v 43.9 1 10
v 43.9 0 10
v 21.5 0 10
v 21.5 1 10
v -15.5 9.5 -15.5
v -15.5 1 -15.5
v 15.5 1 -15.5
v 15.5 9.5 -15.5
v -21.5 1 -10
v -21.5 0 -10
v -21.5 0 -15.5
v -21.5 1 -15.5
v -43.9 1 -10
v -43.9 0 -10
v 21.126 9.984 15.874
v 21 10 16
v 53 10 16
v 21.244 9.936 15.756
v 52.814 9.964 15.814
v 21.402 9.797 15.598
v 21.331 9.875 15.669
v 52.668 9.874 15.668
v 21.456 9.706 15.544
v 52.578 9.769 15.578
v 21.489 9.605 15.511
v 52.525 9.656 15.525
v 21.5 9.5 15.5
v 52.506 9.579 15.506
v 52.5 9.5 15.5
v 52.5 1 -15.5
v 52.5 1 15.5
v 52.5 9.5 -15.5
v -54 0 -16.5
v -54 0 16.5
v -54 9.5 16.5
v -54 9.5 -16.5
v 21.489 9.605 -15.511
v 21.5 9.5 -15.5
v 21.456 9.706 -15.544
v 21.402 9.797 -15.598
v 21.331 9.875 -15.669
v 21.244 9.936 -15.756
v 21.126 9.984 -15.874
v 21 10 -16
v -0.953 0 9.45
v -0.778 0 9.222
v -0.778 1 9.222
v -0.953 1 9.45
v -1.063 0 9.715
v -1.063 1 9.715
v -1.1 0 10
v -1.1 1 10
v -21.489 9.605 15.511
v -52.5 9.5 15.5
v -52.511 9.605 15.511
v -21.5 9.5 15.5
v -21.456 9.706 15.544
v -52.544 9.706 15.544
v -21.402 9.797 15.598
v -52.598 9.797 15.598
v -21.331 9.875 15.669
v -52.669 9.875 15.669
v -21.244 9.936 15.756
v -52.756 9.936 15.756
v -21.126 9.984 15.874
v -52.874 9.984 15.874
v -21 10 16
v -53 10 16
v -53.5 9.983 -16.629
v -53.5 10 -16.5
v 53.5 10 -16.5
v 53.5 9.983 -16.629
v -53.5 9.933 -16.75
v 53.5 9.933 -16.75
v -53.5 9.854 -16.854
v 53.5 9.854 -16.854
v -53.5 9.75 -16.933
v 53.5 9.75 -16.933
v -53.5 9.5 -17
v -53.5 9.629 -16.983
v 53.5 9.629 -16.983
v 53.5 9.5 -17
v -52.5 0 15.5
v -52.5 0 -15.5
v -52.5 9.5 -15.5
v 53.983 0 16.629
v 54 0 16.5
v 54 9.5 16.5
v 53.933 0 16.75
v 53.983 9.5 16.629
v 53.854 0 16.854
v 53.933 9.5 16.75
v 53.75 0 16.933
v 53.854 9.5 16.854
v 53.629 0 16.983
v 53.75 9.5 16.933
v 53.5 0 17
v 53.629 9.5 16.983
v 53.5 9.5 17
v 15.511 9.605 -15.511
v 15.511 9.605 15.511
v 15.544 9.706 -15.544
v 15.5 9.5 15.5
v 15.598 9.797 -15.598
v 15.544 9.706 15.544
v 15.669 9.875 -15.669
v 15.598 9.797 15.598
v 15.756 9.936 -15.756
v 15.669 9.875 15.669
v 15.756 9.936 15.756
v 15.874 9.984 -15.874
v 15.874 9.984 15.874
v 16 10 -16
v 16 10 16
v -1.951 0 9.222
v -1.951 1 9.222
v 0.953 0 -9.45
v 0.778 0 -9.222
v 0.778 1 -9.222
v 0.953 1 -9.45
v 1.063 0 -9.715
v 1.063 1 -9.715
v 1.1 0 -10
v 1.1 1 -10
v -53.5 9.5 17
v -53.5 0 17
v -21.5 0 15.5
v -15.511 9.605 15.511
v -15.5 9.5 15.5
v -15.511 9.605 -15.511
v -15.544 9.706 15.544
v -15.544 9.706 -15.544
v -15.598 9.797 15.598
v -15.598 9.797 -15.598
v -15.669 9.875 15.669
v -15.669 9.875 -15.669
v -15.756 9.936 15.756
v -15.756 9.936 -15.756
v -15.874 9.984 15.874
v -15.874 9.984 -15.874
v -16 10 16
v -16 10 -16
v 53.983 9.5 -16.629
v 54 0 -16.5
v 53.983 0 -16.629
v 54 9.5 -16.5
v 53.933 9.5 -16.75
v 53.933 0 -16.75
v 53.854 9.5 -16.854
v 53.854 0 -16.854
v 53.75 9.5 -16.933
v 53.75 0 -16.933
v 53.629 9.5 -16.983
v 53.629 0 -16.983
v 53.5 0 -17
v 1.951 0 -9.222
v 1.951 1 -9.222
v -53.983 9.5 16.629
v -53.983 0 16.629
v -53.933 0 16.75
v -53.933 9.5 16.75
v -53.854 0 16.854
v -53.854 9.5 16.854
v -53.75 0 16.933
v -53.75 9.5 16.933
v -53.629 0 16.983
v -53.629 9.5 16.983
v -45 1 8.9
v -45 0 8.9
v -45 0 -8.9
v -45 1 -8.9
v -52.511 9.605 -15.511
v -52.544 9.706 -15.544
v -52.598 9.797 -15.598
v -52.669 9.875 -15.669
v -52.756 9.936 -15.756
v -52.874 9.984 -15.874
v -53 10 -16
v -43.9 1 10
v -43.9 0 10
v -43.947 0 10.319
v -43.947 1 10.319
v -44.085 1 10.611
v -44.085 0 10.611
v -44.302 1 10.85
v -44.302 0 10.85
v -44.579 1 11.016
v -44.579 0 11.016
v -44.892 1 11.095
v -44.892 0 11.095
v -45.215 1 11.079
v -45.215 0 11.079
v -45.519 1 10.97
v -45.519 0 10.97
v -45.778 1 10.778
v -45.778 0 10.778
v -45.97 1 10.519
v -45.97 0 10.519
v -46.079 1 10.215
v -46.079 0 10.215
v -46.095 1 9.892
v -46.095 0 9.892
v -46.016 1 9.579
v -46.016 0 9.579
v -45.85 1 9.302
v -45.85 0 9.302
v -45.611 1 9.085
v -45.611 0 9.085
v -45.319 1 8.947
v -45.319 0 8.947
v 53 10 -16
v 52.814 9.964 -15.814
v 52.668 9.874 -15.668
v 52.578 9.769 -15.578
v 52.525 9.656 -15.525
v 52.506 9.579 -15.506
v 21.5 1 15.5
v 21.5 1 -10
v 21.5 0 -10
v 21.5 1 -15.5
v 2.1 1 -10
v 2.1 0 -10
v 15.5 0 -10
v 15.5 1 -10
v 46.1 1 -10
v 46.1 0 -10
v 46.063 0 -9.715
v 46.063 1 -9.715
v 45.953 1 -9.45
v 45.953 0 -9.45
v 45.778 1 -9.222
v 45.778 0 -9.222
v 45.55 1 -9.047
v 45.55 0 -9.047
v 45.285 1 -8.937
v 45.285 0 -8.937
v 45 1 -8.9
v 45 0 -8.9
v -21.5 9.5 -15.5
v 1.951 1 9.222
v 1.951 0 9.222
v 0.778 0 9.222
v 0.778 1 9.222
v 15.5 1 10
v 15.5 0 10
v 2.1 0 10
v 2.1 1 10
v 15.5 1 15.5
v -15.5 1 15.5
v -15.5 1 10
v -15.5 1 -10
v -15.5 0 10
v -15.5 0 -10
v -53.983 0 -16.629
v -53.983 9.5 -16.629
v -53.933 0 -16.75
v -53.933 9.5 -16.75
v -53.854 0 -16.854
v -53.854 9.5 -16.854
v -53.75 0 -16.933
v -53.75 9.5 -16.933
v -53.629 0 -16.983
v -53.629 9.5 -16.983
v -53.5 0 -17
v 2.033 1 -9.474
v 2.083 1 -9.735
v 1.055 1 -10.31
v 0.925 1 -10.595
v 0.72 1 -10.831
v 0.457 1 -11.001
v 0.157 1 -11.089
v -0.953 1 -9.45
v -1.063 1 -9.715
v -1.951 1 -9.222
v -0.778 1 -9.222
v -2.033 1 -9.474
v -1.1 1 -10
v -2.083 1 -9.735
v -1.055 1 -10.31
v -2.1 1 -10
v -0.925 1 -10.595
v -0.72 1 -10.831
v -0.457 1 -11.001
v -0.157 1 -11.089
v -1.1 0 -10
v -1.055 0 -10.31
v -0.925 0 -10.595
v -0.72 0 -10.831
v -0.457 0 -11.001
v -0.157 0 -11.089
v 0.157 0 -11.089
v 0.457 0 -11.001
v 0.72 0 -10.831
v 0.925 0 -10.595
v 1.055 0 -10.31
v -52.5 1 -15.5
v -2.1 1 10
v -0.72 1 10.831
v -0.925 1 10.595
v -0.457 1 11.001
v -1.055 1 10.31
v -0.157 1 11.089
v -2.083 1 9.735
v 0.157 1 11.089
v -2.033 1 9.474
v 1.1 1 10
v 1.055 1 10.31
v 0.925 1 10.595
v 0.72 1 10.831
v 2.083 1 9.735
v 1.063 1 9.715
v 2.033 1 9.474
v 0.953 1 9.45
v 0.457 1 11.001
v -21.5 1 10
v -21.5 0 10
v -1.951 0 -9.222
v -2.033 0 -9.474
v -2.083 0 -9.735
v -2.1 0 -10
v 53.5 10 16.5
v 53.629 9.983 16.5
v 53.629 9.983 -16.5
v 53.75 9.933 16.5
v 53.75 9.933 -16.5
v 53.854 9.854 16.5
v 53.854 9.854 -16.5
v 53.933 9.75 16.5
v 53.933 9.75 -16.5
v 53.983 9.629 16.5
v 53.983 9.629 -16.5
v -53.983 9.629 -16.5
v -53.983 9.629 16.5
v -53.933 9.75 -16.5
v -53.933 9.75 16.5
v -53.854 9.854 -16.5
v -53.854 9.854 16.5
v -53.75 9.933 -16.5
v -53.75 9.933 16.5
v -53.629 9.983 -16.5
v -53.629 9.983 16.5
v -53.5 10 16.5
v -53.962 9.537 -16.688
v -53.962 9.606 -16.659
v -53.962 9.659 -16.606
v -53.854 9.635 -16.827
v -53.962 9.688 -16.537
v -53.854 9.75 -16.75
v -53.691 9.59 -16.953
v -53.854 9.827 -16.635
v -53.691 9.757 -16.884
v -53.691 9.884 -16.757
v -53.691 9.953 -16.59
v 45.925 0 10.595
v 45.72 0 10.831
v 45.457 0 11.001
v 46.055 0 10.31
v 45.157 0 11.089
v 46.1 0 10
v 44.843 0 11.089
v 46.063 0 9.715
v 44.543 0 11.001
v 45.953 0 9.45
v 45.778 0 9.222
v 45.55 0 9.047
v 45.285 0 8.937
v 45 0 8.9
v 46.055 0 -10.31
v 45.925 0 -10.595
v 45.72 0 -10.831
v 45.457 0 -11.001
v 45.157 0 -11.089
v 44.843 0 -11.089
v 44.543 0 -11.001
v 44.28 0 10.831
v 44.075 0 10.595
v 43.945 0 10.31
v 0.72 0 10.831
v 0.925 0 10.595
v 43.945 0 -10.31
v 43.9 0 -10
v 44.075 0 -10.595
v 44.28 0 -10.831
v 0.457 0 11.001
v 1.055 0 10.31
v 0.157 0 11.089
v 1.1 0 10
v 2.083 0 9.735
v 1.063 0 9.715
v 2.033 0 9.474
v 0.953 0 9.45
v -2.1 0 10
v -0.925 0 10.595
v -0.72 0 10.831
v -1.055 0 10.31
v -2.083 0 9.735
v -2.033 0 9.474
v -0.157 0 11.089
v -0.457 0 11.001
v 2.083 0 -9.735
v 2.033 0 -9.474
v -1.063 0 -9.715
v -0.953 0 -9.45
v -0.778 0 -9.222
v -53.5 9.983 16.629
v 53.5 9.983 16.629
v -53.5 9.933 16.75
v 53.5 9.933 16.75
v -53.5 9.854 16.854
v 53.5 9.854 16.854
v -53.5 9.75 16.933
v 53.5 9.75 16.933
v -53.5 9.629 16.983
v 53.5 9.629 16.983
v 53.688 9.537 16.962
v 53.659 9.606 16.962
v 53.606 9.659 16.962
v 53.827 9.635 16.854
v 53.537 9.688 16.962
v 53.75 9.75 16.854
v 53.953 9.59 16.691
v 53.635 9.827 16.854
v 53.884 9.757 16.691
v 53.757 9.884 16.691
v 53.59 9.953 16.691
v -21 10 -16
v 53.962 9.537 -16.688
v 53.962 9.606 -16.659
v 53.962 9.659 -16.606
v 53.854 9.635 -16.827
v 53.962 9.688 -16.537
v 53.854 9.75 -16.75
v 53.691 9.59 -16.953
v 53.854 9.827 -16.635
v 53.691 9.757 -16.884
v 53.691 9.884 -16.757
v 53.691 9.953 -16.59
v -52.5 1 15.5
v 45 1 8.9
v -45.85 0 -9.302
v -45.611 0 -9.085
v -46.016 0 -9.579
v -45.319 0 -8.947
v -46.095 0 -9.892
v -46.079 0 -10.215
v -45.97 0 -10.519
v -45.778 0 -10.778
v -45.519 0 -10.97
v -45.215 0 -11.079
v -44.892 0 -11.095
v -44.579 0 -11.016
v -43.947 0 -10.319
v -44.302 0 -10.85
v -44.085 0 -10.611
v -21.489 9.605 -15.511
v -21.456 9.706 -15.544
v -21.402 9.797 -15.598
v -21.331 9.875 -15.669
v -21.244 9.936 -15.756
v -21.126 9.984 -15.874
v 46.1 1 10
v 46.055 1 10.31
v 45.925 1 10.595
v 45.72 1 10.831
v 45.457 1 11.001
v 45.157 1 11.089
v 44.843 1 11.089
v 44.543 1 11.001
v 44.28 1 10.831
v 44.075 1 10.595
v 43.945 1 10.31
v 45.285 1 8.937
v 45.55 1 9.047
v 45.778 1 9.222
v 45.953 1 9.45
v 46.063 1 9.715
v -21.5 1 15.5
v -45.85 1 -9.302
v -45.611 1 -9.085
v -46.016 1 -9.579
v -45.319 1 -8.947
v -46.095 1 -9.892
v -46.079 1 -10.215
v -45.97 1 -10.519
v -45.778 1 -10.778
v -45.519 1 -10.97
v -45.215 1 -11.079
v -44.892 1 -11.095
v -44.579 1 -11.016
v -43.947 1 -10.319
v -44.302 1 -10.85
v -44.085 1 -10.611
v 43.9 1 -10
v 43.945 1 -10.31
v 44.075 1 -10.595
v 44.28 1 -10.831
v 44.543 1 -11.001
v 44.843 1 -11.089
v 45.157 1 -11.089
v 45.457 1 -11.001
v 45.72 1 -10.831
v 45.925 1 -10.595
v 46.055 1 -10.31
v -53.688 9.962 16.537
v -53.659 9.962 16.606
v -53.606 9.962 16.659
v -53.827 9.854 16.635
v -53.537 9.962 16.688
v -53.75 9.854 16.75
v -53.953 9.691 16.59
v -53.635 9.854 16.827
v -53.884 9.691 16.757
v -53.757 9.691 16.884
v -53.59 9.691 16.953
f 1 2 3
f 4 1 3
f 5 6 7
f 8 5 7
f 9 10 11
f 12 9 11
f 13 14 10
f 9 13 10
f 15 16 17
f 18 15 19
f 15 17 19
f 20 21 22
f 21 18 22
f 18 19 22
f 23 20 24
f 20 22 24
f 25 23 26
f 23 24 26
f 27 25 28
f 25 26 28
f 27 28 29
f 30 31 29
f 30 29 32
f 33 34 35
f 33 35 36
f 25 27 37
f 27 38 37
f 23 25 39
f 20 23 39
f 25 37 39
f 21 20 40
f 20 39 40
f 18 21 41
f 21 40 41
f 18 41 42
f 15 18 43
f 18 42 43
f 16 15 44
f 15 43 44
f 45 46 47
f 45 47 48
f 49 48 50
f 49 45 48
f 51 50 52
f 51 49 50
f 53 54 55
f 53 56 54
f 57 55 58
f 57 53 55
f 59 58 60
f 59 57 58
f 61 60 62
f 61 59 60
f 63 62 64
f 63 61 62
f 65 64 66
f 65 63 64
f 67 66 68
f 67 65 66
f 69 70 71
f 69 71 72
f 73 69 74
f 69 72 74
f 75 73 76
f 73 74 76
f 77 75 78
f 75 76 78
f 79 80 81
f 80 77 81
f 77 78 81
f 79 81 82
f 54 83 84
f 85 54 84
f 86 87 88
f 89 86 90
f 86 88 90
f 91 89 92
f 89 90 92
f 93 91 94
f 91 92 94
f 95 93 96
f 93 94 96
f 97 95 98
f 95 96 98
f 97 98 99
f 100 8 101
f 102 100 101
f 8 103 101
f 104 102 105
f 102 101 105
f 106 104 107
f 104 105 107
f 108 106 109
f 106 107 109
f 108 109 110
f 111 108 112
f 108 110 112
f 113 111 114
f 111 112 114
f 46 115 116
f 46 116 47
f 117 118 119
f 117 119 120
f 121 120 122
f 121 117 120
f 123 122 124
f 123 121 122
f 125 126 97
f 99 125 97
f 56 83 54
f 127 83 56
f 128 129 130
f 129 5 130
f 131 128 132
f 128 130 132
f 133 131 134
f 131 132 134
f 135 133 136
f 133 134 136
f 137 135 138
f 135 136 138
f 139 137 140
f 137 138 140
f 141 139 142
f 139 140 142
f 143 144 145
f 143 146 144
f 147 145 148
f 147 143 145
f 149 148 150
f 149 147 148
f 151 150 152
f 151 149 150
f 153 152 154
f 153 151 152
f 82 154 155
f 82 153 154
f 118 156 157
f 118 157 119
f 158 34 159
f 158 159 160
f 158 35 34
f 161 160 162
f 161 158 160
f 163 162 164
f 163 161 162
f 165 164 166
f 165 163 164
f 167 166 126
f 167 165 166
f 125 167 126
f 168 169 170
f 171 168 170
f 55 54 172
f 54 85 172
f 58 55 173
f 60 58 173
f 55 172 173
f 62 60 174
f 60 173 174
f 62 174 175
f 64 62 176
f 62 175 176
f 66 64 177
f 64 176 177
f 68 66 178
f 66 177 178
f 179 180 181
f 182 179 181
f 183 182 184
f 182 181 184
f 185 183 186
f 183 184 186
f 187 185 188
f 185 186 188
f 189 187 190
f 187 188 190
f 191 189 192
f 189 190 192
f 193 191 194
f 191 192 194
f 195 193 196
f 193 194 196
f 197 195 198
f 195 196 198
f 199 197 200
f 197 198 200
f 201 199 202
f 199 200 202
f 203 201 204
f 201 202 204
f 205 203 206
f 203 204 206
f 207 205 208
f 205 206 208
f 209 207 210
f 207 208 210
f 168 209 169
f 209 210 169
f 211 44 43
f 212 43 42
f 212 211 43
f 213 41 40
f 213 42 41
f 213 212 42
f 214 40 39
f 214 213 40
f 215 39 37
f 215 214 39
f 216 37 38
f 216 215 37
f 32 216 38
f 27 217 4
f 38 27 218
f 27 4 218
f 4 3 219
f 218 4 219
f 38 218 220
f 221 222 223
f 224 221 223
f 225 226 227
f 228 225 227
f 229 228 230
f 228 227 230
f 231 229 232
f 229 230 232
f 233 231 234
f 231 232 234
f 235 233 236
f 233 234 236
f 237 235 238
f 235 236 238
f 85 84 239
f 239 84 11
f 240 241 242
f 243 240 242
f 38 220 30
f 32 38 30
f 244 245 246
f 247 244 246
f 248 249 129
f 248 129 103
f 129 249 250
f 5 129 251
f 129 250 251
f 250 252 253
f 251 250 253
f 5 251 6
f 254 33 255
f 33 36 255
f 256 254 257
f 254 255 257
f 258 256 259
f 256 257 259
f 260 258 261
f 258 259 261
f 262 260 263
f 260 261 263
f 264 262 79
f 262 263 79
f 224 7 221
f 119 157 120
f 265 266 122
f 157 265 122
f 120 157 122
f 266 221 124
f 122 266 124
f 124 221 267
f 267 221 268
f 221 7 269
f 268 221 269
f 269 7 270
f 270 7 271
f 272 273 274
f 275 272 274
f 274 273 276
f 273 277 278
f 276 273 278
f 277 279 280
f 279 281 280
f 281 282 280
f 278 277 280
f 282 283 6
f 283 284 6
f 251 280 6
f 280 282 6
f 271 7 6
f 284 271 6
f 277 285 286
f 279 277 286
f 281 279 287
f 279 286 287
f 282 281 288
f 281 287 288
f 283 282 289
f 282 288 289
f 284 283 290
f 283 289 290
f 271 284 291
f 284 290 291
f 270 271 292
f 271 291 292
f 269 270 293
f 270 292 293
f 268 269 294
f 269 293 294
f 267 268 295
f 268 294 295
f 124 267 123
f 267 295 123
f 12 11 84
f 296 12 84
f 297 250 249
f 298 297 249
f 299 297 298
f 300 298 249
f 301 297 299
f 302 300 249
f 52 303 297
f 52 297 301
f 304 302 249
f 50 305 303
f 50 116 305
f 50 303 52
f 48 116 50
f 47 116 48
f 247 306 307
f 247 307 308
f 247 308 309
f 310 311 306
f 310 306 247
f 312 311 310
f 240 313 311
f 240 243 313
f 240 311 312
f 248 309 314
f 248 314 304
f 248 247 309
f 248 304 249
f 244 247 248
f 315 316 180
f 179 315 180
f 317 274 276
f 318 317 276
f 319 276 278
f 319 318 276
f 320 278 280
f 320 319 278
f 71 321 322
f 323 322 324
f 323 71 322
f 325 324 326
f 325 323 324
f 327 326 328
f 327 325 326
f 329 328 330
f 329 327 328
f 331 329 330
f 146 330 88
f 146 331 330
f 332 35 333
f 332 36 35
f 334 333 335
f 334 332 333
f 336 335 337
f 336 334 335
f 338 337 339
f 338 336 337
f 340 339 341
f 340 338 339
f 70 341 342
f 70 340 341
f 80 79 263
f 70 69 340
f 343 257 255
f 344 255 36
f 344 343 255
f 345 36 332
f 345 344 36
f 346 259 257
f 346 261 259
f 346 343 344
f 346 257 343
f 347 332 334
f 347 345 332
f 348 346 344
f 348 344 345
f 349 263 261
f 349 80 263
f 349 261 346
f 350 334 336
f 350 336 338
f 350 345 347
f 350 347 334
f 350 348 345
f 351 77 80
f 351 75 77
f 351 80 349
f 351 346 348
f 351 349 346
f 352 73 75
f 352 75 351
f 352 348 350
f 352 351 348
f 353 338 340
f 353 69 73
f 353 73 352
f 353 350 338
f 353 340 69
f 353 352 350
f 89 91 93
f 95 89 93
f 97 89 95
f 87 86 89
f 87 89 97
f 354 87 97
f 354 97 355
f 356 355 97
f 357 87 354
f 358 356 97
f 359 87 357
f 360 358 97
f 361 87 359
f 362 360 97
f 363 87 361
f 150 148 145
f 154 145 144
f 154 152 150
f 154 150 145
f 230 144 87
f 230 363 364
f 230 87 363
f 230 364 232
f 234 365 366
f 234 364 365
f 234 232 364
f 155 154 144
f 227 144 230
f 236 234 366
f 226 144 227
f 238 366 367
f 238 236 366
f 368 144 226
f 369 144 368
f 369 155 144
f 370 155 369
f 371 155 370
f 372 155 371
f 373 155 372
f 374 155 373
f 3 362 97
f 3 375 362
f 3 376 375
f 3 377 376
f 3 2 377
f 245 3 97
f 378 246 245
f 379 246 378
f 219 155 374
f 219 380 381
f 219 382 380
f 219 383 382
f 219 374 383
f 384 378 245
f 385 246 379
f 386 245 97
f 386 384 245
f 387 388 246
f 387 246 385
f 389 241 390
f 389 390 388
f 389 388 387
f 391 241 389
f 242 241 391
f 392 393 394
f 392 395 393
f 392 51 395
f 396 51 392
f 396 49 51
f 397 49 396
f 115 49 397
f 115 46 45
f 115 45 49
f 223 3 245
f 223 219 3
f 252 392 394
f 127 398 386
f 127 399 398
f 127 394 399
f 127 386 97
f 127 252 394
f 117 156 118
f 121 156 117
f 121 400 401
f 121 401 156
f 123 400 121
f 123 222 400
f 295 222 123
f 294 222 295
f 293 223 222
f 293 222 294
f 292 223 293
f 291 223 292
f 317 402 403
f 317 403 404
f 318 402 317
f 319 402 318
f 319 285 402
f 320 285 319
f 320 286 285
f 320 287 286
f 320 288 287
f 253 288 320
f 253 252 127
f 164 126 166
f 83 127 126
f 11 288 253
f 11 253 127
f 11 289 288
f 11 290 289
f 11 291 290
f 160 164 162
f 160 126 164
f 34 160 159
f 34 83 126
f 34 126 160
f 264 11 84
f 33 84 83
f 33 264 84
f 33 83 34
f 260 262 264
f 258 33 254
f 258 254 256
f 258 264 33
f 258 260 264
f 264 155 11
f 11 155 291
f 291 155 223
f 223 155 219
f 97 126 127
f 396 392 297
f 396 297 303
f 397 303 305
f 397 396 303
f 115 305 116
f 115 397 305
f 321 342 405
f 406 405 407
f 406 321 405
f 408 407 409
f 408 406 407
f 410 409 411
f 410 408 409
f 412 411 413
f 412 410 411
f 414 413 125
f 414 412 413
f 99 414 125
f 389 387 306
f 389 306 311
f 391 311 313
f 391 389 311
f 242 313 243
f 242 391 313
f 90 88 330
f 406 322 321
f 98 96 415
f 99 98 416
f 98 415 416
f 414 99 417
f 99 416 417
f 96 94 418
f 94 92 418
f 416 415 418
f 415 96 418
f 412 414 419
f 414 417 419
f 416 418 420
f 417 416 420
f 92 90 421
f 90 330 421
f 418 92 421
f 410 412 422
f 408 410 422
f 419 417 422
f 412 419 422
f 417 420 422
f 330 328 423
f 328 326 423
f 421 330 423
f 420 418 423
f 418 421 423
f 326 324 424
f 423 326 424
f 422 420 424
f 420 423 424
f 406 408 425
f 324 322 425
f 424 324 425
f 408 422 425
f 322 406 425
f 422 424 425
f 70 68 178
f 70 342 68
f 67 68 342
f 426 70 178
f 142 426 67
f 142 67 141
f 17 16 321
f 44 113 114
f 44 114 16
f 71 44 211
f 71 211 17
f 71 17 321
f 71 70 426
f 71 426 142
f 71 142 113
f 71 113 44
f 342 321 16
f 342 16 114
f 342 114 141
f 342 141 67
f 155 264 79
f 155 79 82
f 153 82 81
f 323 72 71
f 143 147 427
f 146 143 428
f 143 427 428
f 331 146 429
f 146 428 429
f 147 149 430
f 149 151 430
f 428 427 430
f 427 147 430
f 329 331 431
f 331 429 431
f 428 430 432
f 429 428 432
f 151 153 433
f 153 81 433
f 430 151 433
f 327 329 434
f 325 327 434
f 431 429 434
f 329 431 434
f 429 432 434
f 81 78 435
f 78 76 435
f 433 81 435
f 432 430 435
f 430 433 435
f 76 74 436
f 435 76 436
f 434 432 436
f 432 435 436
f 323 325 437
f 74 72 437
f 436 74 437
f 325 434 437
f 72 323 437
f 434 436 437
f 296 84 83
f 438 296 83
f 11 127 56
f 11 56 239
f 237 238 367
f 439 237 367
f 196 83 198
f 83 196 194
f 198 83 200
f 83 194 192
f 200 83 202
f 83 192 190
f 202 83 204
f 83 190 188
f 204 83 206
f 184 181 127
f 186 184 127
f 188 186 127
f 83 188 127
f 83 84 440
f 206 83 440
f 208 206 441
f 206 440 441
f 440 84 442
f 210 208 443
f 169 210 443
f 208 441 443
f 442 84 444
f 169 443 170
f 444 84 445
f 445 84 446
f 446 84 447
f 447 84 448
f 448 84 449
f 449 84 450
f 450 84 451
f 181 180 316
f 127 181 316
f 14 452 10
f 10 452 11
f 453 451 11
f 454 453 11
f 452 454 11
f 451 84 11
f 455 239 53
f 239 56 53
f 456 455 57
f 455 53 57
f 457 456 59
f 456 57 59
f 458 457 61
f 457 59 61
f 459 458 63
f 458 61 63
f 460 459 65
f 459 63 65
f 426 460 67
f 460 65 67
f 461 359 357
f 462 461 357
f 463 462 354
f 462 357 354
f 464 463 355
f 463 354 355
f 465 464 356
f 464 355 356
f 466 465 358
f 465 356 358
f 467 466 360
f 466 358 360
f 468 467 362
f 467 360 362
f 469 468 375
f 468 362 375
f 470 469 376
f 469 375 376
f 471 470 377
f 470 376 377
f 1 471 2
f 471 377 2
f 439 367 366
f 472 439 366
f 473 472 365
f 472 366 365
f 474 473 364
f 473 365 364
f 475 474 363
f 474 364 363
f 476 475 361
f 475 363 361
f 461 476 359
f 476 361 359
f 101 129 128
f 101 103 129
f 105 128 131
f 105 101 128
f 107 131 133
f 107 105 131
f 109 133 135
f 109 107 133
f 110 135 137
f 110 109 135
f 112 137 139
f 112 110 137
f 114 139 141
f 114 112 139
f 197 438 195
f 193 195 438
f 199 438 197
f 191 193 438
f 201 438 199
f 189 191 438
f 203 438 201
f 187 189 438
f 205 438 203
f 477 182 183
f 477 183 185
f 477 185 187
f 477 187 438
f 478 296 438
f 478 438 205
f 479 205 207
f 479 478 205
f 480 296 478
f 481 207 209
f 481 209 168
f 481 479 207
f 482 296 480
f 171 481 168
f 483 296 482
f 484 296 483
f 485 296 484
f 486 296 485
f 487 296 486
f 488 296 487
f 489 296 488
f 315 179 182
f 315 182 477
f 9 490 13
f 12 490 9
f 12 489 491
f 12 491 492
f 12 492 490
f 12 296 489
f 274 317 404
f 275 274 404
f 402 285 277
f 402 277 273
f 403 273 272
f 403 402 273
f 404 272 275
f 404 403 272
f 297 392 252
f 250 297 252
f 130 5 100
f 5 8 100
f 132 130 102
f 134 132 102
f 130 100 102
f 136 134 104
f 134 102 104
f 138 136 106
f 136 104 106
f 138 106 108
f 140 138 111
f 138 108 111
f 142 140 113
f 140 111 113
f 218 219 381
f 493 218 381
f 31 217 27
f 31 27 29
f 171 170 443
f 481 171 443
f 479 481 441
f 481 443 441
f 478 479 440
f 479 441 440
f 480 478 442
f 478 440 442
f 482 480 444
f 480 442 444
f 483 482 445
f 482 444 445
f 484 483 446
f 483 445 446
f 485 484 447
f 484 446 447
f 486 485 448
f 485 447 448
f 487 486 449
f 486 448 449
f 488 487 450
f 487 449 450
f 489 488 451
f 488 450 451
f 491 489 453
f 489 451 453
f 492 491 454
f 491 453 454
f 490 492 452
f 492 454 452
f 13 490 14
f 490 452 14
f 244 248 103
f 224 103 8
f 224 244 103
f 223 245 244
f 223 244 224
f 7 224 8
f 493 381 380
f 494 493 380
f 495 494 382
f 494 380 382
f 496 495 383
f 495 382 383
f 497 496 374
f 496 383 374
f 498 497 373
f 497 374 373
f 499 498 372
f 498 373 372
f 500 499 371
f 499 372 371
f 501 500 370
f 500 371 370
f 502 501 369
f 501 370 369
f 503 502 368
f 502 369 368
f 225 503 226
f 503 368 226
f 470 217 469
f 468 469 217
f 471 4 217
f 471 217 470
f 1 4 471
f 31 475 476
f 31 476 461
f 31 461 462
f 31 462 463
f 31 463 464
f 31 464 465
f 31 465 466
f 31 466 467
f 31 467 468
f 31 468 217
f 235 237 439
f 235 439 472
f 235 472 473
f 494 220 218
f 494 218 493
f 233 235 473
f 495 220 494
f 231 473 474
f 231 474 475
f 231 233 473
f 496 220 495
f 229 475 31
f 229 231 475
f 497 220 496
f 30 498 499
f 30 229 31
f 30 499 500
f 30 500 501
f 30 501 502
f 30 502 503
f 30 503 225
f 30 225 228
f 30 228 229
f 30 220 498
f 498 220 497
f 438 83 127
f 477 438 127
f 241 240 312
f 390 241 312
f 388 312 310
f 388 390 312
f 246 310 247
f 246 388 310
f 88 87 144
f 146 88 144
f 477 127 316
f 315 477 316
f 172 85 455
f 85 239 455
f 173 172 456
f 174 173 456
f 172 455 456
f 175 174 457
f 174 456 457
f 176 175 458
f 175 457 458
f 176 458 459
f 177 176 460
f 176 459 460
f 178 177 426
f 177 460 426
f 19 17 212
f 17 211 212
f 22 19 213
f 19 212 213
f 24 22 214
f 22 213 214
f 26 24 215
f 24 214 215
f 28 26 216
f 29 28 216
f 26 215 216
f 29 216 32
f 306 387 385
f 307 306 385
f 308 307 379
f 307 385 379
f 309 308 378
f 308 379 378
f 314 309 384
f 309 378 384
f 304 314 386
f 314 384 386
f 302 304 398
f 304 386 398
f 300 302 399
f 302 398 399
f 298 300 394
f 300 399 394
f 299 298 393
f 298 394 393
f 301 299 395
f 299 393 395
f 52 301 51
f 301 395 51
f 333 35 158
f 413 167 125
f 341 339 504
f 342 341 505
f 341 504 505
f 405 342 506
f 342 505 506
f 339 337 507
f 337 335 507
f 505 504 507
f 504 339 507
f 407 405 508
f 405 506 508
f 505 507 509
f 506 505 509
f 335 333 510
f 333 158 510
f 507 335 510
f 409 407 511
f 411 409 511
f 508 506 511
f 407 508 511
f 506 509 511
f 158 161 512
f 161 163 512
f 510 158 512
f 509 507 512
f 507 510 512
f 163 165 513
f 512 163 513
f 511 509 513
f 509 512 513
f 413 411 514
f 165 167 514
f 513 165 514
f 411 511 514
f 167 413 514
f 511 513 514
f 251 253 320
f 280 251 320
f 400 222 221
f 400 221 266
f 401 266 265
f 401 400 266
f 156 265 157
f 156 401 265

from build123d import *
from build123d.topology import SkipClean

# Parameters (mm, degrees)
EXTRUDE_1_DEPTH   = 1
EXTRUDE_1_2_DEPTH = 1
EXTRUDE_1_3_DEPTH = 1
EXTRUDE_1_4_DEPTH = 1
SKETCH_1_3_W      = 108
SKETCH_1_3_H      = 34
SKETCH_1_3_W_2    = 105
SKETCH_1_3_H_2    = 31
SKETCH_1_3_W_3    = 6
SKETCH_1_3_H_3    = 20
SKETCH_1_3_H_4    = 5.5
EXTRUDE_2_DEPTH   = 10
FILLET_1_R        = 0.5
FILLET_2_R        = 0.5
EXTRUDE_3_DEPTH   = 1
CHAMFER_1_SIZE    = 1


with BuildPart() as part:
    # 草图1 → 凸台-拉伸1 (new body)
    with BuildSketch(Plane(origin=(0, 0, 0), x_dir=(1, 0, 0), z_dir=(0, 1, 0))):
        with BuildLine():
            Line((-21.5, 10), (-21.5, 15.5))
            Line((-21.5, 15.5), (-52.5, 15.5))
            Line((-52.5, 15.5), (-52.5, -15.5))
            Line((-52.5, -15.5), (-21.5, -15.5))
            Line((-21.5, -15.5), (-21.5, -10))
            Line((-21.5, -10), (-43.9, -10))
            ThreePointArc((-43.9, -10), (-45.777817459, -10.777817459), (-45, -8.9))
            Line((-45, -8.9), (-45, 8.9))
            ThreePointArc((-45, 8.9), (-45.777817459, 10.777817459), (-43.9, 10))
            Line((-43.9, 10), (-21.5, 10))
        make_face()
    extrude(amount=EXTRUDE_1_DEPTH)


with BuildPart() as body_2:
    # 草图1 → Extrude 1 2 (new body)
    with BuildSketch(Plane(origin=(0, 0, 0), x_dir=(1, 0, 0), z_dir=(0, 1, 0))):
        with BuildLine():
            Line((-1.1, -10), (-15.5, -10))
            Line((-15.5, -10), (-15.5, -15.5))
            Line((-15.5, -15.5), (15.5, -15.5))
            Line((15.5, -15.5), (15.5, -10))
            Line((15.5, -10), (1.1, -10))
            ThreePointArc((1.1, -10), (0, -11.1), (-1.1, -10))
        make_face()
    extrude(amount=EXTRUDE_1_2_DEPTH)


with BuildPart() as body_3:
    # 草图1 → Extrude 1 3 (new body)
    with BuildSketch(Plane(origin=(0, 0, 0), x_dir=(1, 0, 0), z_dir=(0, 1, 0))):
        with BuildLine():
            Line((15.5, 15.5), (-15.5, 15.5))
            Line((-15.5, 15.5), (-15.5, 10))
            Line((-15.5, 10), (-1.1, 10))
            ThreePointArc((-1.1, 10), (0, 11.1), (1.1, 10))
            Line((1.1, 10), (15.5, 10))
            Line((15.5, 10), (15.5, 15.5))
        make_face()
    extrude(amount=EXTRUDE_1_3_DEPTH)


with BuildPart() as body_4:
    # 草图1 → Extrude 1 4 (new body)
    with BuildSketch(Plane(origin=(0, 0, 0), x_dir=(1, 0, 0), z_dir=(0, 1, 0))):
        with BuildLine():
            Line((52.5, 15.5), (21.5, 15.5))
            Line((21.5, 15.5), (21.5, 10))
            Line((21.5, 10), (43.9, 10))
            ThreePointArc((43.9, 10), (45, 11.1), (46.1, 10))
            ThreePointArc((46.1, 10), (45.777817459, 9.222182541), (45, 8.9))
            Line((45, 8.9), (45, -8.9))
            ThreePointArc((45, -8.9), (45.777817459, -9.222182541), (46.1, -10))
            ThreePointArc((46.1, -10), (45, -11.1), (43.9, -10))
            Line((43.9, -10), (21.5, -10))
            Line((21.5, -10), (21.5, -15.5))
            Line((21.5, -15.5), (52.5, -15.5))
            Line((52.5, -15.5), (52.5, 15.5))
        make_face()
    extrude(amount=EXTRUDE_1_4_DEPTH)

    # 草图1<3> → 凸台-拉伸2 (add)
    # profile 1 of 7: a face of its own
    with BuildSketch(Plane(origin=(0, 0, 0), x_dir=(1, 0, 0), z_dir=(0, 1, 0))):
        Rectangle(SKETCH_1_3_W, SKETCH_1_3_H)
        Rectangle(SKETCH_1_3_W_2, SKETCH_1_3_H_2, mode=Mode.SUBTRACT)
    # profile 2 of 7: a face of its own
    with BuildSketch(Plane(origin=(0, 0, 0), x_dir=(1, 0, 0), z_dir=(0, 1, 0))):
        with Locations((-18.5, 0)):
            Rectangle(SKETCH_1_3_W_3, SKETCH_1_3_H_3)
    # profile 3 of 7: a face of its own
    with BuildSketch(Plane(origin=(0, 0, 0), x_dir=(1, 0, 0), z_dir=(0, 1, 0))):
        with Locations((18.5, 0)):
            Rectangle(SKETCH_1_3_W_3, SKETCH_1_3_H_3)
    # profile 4 of 7: a face of its own
    with BuildSketch(Plane(origin=(0, 0, 0), x_dir=(1, 0, 0), z_dir=(0, 1, 0))):
        with Locations((-18.5, 12.75)):
            Rectangle(SKETCH_1_3_W_3, SKETCH_1_3_H_4)
    # profile 5 of 7: a face of its own
    with BuildSketch(Plane(origin=(0, 0, 0), x_dir=(1, 0, 0), z_dir=(0, 1, 0))):
        with Locations((-18.5, -12.75)):
            Rectangle(SKETCH_1_3_W_3, SKETCH_1_3_H_4)
    # profile 6 of 7: a face of its own
    with BuildSketch(Plane(origin=(0, 0, 0), x_dir=(1, 0, 0), z_dir=(0, 1, 0))):
        with Locations((18.5, 12.75)):
            Rectangle(SKETCH_1_3_W_3, SKETCH_1_3_H_4)
    # profile 7 of 7: a face of its own
    with BuildSketch(Plane(origin=(0, 0, 0), x_dir=(1, 0, 0), z_dir=(0, 1, 0))):
        with Locations((18.5, -12.75)):
            Rectangle(SKETCH_1_3_W_3, SKETCH_1_3_H_4)
    extrude(amount=EXTRUDE_2_DEPTH)

    # 圆角1
    fillet_1_edges = [body_4.edges().sort_by_distance(p)[0] for p in [
        (0, 10, -17),
        (54, 5, -17),
        (-54, 5, -17),
        (-54, 5, 17),
        (54, 10, 0),
        (54, 5, 17),
        (-54, 10, 0),
        (0, 10, 17),
    ]]
    fillet(fillet_1_edges, radius=FILLET_1_R)

    # 圆角2
    fillet_2_edges = [body_4.edges().sort_by_distance(p)[0] for p in [
        (21.5, 10, 0),
        (-37, 10, 15.5),
        (37, 10, 15.5),
        (-15.5, 10, 0),
        (-52.5, 10, 0),
        (0, 10, 15.5),
        (0, 10, -15.5),
        (15.5, 10, 0),
        (37, 10, -15.5),
        (52.5, 10, 0),
        (-37, 10, -15.5),
        (-21.5, 10, 0),
    ]]
    fillet(fillet_2_edges, radius=FILLET_2_R)


    with SkipClean():  # the faces are left unmerged after this step: merging them gives an invalid solid
        add(body_2.part)  # 凸台-拉伸3 merges body 2

        add(body_3.part)  # 凸台-拉伸3 merges body 3
        # 草图2 → 凸台-拉伸3 (add)
        with BuildSketch(Plane(origin=(0, 0, 0), x_dir=(1, 0, 0), z_dir=(0, 1, 0))):
            with BuildLine():
                ThreePointArc((2.1, 10), (1.940147018, 9.196364792), (1.48492424, 8.51507576))
                Line((1.48492424, 8.51507576), (0.777817459, 9.222182541))
                ThreePointArc((0.777817459, 9.222182541), (1.016267486, 9.579048224), (1.1, 10))
                Line((1.1, 10), (2.1, 10))
            make_face()
            with BuildLine():
                Line((-0.777817459, 9.222182541), (-1.48492424, 8.51507576))
                ThreePointArc((-1.48492424, 8.51507576), (-1.940147018, 9.196364792), (-2.1, 10))
                Line((-2.1, 10), (-1.1, 10))
                ThreePointArc((-1.1, 10), (-1.016267486, 9.579048224), (-0.777817459, 9.222182541))
            make_face()
            with BuildLine():
                Line((0.777817459, -9.222182541), (1.48492424, -8.51507576))
                ThreePointArc((1.48492424, -8.51507576), (1.940147018, -9.196364792), (2.1, -10))
                Line((2.1, -10), (1.1, -10))
                ThreePointArc((1.1, -10), (1.016267486, -9.579048224), (0.777817459, -9.222182541))
            make_face()
            with BuildLine():
                ThreePointArc((-2.1, -10), (-1.940147018, -9.196364792), (-1.48492424, -8.51507576))
                Line((-1.48492424, -8.51507576), (-0.777817459, -9.222182541))
                ThreePointArc((-0.777817459, -9.222182541), (-1.016267486, -9.579048224), (-1.1, -10))
                Line((-1.1, -10), (-2.1, -10))
            make_face()
        extrude(amount=EXTRUDE_3_DEPTH)

    # 倒角1
    # the kernel refuses this chamfer: 1 mm, written as the material it takes off along each edge
    with BuildSketch(Plane(origin=(-1.48492424, -2.571682988, 8.51507576), x_dir=(-0.5500408161449349, 0, 0.8351377734090429), z_dir=(0, 1, 0)), Plane(origin=(1.48492424, -2.571682988, -8.51507576), x_dir=(0.5500408161449349, 0, -0.8351377734090429), z_dir=(0, 1, 0))) as chamfer_1_piece_1:
        with BuildLine():
            Line((0.846694765, 0), (CHAMFER_1_SIZE * 0.201593991777, CHAMFER_1_SIZE * 0.979469173828))
            Line((CHAMFER_1_SIZE * 0.201593991777, CHAMFER_1_SIZE * 0.979469173828), (0, 0))
            ThreePointArc((0, 0), (0.434488163, -0.043085183), (0.846694765, 0))
        make_face()
    extrude(amount=6.143365976, mode=Mode.SUBTRACT)
    with BuildSketch(Plane(origin=(1.48492424, -2.571682988, 8.51507576), x_dir=(0.5500408161449355, 0, 0.8351377734090426), z_dir=(0, 1, 0)), Plane(origin=(-1.48492424, -2.571682988, -8.51507576), x_dir=(-0.5500408161449349, 0, -0.8351377734090429), z_dir=(0, 1, 0))) as chamfer_1_piece_2:
        with BuildLine():
            Line((0.846694765, 0), (CHAMFER_1_SIZE * 0.201593991777, -CHAMFER_1_SIZE * 0.979469173828))
            Line((CHAMFER_1_SIZE * 0.201593991777, -CHAMFER_1_SIZE * 0.979469173828), (0, 0))
            ThreePointArc((0, 0), (0.434488163, 0.043085183), (0.846694765, 0))
        make_face()
    extrude(amount=6.143365976, mode=Mode.SUBTRACT)


solid = Compound([part.part, body_4.part])
